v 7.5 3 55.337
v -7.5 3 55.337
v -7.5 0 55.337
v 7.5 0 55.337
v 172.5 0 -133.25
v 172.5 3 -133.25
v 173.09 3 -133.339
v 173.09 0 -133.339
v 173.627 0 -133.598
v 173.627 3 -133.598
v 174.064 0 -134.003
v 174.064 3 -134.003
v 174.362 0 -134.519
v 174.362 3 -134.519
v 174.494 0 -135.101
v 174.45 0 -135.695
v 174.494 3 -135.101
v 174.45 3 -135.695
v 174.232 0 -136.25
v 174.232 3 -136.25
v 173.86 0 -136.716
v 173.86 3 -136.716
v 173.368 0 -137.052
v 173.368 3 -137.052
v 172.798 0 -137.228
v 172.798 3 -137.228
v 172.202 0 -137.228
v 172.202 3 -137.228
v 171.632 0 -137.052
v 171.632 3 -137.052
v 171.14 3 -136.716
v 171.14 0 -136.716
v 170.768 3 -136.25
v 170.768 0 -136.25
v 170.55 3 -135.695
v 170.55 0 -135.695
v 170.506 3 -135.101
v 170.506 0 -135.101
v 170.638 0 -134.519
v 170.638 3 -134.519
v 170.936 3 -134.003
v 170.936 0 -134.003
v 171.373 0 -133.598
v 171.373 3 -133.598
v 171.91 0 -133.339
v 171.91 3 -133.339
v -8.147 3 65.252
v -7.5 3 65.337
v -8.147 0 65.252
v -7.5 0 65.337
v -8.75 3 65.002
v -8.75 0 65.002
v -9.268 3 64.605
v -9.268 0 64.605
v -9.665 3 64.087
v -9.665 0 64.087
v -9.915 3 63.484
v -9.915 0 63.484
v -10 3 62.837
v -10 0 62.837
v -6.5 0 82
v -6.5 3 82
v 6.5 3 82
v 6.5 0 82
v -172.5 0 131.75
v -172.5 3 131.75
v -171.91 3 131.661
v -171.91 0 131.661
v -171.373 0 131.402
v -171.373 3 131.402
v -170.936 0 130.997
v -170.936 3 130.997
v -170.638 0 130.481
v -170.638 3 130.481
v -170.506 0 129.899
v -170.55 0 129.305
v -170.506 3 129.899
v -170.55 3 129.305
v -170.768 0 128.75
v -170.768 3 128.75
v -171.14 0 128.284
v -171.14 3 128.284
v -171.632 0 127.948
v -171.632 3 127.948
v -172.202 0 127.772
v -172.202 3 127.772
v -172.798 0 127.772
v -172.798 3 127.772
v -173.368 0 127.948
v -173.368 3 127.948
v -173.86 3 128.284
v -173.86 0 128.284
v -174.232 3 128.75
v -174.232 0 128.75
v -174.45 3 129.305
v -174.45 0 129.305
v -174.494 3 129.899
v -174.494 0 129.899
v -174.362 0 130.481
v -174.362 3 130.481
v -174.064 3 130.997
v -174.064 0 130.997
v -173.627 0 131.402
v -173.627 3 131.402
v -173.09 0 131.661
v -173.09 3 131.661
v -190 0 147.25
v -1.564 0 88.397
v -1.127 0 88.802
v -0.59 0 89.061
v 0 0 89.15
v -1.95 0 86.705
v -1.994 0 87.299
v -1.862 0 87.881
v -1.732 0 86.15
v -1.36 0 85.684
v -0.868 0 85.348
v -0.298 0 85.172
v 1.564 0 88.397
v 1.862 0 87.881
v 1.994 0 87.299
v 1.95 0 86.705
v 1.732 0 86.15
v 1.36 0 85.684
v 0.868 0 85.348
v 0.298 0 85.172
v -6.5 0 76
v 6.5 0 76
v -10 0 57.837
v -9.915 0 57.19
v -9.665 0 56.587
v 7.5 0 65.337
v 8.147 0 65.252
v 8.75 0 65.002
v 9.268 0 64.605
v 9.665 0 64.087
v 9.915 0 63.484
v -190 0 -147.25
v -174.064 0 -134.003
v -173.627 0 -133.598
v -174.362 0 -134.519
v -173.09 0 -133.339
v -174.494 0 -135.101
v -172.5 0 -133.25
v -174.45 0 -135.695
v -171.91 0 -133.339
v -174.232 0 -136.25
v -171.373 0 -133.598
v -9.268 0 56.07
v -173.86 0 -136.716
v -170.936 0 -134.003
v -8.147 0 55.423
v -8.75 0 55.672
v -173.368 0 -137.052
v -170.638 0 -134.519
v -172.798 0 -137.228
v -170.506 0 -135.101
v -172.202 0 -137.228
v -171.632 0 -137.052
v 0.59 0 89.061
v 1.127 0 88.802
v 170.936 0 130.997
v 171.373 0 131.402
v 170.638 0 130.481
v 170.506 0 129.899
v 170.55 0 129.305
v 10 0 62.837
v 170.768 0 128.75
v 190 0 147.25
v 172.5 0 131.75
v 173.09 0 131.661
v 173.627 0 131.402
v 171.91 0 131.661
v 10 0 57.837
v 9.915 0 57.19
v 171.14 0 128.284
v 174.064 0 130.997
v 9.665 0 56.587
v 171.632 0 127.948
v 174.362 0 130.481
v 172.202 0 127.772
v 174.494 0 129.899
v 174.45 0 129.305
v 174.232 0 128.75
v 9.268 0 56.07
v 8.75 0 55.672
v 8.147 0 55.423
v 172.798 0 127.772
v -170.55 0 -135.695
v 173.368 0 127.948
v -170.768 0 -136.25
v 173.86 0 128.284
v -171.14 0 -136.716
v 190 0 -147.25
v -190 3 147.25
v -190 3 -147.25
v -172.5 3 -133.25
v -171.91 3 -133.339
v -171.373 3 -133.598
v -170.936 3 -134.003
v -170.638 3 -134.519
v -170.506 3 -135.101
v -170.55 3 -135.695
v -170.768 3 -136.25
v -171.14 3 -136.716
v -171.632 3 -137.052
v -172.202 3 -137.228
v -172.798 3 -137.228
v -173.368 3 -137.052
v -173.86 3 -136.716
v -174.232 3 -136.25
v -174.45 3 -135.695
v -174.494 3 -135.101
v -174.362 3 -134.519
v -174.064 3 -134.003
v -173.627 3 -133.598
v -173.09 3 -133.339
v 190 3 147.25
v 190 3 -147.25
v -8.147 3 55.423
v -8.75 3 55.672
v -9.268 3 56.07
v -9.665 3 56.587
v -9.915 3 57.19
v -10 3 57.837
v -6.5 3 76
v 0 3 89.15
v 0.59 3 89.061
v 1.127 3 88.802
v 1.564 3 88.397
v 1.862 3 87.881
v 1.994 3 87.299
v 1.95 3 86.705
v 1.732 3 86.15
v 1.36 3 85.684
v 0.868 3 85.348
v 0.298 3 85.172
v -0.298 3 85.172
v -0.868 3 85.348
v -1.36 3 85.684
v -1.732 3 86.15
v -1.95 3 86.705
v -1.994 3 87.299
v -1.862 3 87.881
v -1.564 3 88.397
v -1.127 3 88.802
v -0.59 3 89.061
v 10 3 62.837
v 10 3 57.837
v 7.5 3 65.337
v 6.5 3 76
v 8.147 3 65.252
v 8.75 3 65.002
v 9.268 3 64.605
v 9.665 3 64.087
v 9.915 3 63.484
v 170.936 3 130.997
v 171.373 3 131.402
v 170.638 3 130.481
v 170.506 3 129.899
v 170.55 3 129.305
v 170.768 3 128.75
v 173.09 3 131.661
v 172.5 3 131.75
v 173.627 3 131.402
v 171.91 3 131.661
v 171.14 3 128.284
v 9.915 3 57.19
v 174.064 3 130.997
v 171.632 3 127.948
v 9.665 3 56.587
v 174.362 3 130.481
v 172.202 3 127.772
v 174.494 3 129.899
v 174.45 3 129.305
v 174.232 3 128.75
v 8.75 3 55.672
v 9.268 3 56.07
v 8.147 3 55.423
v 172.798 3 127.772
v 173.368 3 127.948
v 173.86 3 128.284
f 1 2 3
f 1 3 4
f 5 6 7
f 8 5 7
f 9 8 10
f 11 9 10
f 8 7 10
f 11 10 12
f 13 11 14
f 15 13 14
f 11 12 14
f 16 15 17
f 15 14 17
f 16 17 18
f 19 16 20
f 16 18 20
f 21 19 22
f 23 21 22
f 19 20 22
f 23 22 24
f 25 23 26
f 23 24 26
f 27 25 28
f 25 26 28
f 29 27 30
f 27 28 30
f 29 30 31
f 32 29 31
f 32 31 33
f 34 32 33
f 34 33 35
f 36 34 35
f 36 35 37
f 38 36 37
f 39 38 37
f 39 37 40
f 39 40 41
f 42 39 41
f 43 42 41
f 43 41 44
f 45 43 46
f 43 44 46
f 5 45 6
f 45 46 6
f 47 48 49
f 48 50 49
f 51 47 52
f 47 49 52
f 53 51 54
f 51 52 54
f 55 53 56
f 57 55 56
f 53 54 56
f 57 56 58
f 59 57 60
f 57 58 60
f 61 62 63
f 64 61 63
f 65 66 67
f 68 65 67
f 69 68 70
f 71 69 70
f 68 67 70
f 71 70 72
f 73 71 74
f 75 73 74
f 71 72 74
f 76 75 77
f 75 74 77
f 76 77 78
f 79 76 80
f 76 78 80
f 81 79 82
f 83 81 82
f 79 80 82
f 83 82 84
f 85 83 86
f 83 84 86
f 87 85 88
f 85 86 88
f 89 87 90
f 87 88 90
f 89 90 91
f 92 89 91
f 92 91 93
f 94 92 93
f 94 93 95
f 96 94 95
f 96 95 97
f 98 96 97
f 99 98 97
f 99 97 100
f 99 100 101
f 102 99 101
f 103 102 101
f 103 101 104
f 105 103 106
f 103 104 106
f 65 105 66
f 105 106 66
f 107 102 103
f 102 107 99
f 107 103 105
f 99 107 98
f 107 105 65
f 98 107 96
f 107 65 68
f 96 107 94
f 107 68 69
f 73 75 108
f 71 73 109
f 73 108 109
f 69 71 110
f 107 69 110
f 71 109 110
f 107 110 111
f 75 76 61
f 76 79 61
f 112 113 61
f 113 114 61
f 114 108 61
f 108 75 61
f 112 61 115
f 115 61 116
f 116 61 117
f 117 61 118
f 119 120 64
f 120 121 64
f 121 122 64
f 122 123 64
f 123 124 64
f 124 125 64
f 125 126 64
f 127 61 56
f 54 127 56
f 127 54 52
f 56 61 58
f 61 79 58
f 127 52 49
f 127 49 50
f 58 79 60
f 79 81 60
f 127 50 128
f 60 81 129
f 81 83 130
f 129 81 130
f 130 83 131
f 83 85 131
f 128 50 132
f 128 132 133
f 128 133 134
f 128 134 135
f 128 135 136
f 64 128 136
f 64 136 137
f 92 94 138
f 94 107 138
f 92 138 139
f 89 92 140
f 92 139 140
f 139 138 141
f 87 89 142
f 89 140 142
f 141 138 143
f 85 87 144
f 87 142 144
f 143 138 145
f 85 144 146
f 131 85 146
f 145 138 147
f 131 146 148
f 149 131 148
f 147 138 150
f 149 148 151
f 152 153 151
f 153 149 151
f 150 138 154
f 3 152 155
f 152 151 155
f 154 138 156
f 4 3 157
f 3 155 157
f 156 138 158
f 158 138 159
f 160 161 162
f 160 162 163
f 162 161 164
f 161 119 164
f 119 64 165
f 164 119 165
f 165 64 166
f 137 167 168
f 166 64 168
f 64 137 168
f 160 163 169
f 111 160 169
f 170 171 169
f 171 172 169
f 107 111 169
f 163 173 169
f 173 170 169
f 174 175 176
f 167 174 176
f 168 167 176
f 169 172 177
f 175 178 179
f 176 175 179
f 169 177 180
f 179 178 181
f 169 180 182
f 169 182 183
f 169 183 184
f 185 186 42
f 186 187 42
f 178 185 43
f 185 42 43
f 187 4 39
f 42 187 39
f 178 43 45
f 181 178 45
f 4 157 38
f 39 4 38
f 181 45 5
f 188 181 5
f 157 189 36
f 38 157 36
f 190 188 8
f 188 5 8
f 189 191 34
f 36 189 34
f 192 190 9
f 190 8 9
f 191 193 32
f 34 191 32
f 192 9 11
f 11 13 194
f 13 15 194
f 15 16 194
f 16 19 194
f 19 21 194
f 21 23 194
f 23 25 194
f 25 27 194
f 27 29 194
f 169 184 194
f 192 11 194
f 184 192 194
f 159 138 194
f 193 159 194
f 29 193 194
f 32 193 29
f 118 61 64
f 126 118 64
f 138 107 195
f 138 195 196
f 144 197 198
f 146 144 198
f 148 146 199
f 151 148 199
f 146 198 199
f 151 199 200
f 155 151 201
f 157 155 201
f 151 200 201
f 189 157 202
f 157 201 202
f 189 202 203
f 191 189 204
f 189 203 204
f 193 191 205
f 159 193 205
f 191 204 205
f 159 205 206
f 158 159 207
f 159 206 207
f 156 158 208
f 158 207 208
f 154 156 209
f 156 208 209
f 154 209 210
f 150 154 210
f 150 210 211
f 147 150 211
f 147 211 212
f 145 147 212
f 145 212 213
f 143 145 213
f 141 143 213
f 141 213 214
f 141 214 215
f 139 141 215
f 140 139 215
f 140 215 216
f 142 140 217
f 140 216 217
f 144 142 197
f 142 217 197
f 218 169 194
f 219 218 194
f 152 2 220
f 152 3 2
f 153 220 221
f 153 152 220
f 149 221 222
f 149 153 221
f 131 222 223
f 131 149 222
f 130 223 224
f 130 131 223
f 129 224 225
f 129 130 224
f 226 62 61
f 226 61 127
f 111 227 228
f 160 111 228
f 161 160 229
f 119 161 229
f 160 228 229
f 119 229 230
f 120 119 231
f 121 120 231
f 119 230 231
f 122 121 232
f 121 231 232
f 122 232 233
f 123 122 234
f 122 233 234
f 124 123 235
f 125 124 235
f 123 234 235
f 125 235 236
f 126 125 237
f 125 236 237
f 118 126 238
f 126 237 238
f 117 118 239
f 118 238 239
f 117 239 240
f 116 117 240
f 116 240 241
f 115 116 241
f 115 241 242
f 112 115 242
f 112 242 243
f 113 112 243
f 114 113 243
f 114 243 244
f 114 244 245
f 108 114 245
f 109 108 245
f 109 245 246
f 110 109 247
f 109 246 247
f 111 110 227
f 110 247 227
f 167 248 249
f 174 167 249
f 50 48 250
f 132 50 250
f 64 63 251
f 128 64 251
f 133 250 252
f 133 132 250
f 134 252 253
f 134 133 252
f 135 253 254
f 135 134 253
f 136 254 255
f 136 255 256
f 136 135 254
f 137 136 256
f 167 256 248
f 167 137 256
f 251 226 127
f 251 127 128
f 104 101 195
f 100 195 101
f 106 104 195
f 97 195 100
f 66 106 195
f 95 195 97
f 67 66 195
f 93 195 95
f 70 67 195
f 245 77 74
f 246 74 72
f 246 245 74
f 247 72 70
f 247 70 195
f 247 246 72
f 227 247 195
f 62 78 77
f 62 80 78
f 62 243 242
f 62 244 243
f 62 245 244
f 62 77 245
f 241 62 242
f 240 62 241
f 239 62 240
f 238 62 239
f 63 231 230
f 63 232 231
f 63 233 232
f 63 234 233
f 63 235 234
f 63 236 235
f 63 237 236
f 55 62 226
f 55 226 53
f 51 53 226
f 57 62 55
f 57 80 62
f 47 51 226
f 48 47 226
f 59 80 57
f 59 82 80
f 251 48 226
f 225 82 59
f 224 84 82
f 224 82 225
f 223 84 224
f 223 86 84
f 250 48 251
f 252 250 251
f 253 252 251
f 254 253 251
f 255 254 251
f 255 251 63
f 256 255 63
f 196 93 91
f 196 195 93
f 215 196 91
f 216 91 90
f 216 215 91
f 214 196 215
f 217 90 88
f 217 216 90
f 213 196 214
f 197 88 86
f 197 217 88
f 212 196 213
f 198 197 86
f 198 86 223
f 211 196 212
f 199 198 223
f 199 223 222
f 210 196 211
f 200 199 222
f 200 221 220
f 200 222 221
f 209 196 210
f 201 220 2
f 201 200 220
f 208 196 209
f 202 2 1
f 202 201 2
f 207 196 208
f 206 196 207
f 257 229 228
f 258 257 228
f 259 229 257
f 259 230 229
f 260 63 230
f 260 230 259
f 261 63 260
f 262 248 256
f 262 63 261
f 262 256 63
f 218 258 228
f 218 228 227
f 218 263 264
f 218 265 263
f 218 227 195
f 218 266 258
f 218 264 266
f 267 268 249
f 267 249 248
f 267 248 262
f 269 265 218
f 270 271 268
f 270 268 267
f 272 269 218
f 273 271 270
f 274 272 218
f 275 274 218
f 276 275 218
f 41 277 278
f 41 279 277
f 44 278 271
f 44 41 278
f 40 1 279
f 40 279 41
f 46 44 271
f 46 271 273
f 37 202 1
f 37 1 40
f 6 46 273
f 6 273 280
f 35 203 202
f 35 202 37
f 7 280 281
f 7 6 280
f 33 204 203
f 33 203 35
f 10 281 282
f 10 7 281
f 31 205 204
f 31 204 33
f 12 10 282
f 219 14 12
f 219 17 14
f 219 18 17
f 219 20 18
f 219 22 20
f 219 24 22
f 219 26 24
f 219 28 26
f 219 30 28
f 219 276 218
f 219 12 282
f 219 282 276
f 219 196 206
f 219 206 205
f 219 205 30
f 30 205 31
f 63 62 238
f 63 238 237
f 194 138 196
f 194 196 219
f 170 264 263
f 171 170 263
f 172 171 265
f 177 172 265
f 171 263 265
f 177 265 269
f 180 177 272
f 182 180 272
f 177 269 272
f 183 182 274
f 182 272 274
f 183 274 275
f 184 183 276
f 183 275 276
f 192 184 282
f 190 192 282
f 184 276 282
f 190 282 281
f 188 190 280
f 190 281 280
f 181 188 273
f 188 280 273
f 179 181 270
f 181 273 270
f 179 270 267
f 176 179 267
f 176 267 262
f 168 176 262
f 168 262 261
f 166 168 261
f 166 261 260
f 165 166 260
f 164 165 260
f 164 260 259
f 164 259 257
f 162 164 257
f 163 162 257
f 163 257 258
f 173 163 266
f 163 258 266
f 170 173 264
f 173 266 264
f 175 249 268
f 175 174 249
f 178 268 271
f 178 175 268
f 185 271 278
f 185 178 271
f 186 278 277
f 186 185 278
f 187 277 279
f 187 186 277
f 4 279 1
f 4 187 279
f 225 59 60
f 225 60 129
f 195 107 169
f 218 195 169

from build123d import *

# Parameters (mm, degrees)
SKETCH1_W           = 380
SKETCH1_H           = 294.5
BOSS_EXTRUDE1_DEPTH = 3
SKETCH3_R           = 2
SKETCH3_W           = 13
SKETCH3_H           = 6
SKETCH3_W_2         = 20
SKETCH3_H_2         = 10
CUT_EXTRUDE1_DEPTH  = 3
FILLET1_R           = 2.5


with BuildPart() as part:
    # Sketch1 → Boss-Extrude1 (new body)
    with BuildSketch(Plane(origin=(0, 0, 0), x_dir=(1, 0, 0), z_dir=(0, 1, 0))):
        Rectangle(SKETCH1_W, SKETCH1_H)
    extrude(amount=BOSS_EXTRUDE1_DEPTH)

    # Sketch3 → Cut-Extrude1 (cut)
    with BuildSketch(Plane(origin=(0, 3, 0), x_dir=(1, 0, 0), z_dir=(0, 1, 0))):
        with Locations(Location((-172.5, 135.25, 0), (0, 0, 270))):
            Circle(SKETCH3_R)
        with Locations(Location((-172.5, -129.75, 0), (0, 0, 270))):
            Circle(SKETCH3_R)
        with Locations(Location((172.5, -129.75, 0), (0, 0, 270))):
            Circle(SKETCH3_R)
        with Locations(Location((172.5, 135.25, 0), (0, 0, 270))):
            Circle(SKETCH3_R)
        with Locations(Location((0, -87.15, 0), (0, 0, 270))):
            Circle(SKETCH3_R)
        with Locations((0, -79)):
            Rectangle(SKETCH3_W, SKETCH3_H)
        with Locations((0, -60.337381091)):
            Rectangle(SKETCH3_W_2, SKETCH3_H_2)
    extrude(amount=-CUT_EXTRUDE1_DEPTH, mode=Mode.SUBTRACT)

    # Fillet1
    fillet1_edges = [part.edges().sort_by_distance(p)[0] for p in [
        (-10, 1.5, 65.337381091),
        (-10, 1.5, 55.337381091),
        (10, 1.5, 55.337381091),
        (10, 1.5, 65.337381091),
    ]]
    fillet(fillet1_edges, radius=FILLET1_R)


solid = part.part
